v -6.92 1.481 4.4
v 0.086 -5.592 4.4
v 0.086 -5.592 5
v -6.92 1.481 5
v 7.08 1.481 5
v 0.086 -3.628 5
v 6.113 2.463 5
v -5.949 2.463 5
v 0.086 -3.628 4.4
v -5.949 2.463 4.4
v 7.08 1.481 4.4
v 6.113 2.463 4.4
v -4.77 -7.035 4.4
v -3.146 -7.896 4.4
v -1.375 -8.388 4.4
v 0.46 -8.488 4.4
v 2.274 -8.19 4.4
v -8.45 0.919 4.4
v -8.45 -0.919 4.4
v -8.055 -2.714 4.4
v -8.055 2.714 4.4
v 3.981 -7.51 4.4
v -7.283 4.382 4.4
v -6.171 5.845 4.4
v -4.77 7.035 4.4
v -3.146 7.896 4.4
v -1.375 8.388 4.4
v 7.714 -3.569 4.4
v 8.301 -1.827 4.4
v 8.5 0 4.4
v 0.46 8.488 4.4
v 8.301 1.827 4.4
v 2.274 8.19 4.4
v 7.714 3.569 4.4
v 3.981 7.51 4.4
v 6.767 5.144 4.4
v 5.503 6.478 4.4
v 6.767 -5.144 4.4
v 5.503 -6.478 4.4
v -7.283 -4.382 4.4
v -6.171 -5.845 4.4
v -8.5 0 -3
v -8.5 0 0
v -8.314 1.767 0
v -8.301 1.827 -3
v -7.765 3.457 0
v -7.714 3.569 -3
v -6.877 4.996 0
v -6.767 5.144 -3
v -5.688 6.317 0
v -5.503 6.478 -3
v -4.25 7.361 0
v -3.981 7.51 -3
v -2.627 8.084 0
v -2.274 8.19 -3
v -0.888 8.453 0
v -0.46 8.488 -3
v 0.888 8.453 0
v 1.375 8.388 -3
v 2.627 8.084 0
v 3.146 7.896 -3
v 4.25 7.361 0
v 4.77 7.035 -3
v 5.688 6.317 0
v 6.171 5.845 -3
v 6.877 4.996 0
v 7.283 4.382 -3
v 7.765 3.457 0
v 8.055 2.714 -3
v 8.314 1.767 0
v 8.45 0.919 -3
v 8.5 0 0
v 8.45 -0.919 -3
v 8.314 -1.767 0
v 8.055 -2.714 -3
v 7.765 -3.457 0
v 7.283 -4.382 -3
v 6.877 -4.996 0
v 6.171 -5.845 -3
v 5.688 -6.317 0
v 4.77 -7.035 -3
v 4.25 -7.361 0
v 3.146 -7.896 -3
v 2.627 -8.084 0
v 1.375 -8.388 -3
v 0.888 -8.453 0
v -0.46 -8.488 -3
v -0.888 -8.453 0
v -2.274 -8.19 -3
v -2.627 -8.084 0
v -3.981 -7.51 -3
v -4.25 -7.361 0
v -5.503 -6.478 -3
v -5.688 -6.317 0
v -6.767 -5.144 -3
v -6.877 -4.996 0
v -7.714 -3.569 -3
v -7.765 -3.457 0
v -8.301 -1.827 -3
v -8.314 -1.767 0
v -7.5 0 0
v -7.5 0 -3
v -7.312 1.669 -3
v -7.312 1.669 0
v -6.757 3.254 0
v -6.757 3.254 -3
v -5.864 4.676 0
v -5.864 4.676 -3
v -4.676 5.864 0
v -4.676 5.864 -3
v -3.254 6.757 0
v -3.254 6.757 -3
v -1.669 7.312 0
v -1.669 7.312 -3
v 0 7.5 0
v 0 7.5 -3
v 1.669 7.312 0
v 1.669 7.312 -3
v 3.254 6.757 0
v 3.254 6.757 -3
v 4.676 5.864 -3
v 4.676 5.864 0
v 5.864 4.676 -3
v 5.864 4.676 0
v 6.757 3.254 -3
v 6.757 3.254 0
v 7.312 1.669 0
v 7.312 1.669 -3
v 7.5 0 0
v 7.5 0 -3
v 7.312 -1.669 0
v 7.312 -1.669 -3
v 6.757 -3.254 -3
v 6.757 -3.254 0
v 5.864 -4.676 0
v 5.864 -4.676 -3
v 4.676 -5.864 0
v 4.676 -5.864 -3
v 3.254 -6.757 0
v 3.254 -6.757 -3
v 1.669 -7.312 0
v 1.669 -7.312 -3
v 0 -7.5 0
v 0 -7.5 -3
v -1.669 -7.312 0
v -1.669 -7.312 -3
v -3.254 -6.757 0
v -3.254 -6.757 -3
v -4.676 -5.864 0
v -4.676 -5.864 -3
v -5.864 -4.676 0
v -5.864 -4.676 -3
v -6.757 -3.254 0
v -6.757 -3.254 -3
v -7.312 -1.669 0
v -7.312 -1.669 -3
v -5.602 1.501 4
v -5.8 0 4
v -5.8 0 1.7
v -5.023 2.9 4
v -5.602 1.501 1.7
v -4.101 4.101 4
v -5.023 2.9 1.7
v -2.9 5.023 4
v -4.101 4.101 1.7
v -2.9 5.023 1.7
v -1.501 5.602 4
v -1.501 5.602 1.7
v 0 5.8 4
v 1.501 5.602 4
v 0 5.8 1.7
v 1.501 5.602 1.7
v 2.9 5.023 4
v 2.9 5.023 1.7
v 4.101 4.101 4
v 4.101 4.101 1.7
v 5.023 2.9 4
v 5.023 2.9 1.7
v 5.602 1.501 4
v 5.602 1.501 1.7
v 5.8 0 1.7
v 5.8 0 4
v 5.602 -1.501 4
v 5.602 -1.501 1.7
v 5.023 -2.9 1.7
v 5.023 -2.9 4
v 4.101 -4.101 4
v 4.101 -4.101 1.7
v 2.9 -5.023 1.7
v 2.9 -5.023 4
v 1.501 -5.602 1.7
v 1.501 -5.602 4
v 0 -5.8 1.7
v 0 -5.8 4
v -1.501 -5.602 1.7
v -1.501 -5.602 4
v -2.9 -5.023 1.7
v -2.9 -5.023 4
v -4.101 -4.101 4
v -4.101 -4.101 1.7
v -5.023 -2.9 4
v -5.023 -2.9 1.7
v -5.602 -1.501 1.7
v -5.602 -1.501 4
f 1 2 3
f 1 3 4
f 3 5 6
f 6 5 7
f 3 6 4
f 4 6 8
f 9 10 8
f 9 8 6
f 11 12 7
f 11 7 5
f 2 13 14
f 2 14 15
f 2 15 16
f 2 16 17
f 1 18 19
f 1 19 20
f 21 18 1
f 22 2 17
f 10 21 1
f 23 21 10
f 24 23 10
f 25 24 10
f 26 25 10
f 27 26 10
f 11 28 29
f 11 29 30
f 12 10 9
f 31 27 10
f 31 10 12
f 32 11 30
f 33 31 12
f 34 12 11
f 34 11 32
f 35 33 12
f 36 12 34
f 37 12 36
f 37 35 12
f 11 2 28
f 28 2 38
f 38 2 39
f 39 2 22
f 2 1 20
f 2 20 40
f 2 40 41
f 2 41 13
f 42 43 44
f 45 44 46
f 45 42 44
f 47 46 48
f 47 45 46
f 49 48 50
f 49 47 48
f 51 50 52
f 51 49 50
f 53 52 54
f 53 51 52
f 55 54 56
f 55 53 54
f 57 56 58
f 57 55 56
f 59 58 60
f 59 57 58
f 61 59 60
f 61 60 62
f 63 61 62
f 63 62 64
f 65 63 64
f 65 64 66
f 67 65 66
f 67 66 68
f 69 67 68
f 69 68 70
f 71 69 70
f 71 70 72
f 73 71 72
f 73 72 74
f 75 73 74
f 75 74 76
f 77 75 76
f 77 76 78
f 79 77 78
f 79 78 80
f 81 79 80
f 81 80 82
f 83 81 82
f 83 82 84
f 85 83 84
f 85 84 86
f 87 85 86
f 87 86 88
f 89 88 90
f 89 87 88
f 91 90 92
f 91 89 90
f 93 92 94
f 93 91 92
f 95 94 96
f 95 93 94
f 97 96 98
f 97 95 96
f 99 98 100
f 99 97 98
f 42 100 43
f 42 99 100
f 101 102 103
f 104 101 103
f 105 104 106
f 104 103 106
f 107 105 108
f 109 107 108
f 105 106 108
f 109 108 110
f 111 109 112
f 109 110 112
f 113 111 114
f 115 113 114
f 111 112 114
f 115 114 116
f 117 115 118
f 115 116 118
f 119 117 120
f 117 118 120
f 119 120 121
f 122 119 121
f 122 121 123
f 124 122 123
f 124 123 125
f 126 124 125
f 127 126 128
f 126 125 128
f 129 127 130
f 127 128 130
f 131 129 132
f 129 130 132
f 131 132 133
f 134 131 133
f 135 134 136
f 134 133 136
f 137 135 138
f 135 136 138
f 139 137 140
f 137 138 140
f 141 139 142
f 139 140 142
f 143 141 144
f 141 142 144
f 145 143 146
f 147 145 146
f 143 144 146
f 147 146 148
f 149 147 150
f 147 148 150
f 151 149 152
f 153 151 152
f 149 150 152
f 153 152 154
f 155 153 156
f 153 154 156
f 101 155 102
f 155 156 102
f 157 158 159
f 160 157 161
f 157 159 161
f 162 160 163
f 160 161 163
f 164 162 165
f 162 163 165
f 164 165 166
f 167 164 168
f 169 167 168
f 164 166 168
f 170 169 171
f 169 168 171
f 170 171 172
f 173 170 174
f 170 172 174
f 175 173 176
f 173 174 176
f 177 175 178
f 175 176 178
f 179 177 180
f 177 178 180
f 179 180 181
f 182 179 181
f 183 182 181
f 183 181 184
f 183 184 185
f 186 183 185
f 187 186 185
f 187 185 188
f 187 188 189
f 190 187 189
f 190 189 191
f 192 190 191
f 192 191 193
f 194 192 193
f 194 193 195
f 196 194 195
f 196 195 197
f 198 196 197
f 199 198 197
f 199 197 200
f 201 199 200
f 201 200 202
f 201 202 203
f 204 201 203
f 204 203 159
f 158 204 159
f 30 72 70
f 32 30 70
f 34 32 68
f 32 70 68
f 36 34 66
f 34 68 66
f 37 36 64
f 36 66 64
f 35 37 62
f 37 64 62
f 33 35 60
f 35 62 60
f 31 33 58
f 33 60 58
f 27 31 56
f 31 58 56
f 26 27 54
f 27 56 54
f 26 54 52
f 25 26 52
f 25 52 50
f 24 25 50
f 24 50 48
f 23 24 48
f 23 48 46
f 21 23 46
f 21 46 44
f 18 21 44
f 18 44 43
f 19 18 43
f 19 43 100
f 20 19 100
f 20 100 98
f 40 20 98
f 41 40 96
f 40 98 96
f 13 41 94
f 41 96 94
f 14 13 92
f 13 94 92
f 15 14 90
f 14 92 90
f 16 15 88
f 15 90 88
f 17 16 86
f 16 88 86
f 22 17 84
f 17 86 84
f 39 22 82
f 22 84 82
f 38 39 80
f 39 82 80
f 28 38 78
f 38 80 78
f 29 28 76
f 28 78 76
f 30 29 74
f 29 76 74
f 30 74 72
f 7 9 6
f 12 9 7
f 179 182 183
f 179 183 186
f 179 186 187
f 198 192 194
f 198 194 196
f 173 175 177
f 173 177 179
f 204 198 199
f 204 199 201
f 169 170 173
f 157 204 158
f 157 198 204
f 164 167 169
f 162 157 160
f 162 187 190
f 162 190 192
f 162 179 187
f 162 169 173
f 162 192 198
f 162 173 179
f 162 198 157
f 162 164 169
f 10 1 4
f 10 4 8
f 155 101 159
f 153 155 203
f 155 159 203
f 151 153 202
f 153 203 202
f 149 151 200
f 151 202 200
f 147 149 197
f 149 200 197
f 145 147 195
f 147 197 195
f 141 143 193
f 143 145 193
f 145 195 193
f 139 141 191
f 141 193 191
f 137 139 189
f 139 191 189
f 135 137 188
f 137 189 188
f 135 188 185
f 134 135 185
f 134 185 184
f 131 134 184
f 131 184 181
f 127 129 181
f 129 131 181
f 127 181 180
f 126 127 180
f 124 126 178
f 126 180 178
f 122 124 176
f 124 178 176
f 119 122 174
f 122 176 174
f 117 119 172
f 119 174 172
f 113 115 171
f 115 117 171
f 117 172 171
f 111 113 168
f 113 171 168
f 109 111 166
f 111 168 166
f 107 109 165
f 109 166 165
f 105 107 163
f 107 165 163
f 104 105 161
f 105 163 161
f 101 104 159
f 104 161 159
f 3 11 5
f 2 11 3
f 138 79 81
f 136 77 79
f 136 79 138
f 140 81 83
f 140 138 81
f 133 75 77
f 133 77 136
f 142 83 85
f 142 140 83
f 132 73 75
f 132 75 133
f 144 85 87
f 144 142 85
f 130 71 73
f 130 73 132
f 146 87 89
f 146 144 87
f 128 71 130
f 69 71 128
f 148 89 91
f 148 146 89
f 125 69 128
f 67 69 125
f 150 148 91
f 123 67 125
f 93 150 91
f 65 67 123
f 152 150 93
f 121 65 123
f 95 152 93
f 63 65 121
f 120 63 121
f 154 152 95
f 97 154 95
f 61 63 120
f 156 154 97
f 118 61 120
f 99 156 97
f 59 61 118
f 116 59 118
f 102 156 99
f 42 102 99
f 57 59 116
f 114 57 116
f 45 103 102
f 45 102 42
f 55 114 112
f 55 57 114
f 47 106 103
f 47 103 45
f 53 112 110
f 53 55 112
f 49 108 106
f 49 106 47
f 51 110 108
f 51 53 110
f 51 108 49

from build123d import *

# Parameters (mm, degrees)
SKETCH1_R           = 8.5
BOSS_EXTRUDE1_DEPTH = 4.4
SKETCH3_R           = 5.8
CUT_EXTRUDE1_DEPTH  = 4
BOSS_EXTRUDE3_START = 3
SKETCH4_R           = 8.5
SKETCH4_R_2         = 7.5
BOSS_EXTRUDE3_DEPTH = 3
BOSS_EXTRUDE4_DEPTH = 0.6


with BuildPart() as part:
    # Sketch1 → Boss-Extrude1 (new body)
    with BuildSketch(Plane.XY):
        Circle(SKETCH1_R)
    extrude(amount=BOSS_EXTRUDE1_DEPTH)

    # Sketch3 → Cut-Extrude1 (cut)
    with BuildSketch(Plane(origin=(0, 0, 0), x_dir=(-1, 0, 0), z_dir=(0, 0, -1))):
        Circle(SKETCH3_R)
    extrude(amount=-CUT_EXTRUDE1_DEPTH, mode=Mode.SUBTRACT)

    # Sketch4 → Boss-Extrude3 (add)
    with BuildSketch(Plane(origin=(0, 0, 0), x_dir=(-1, 0, 0), z_dir=(0, 0, -1)).offset(BOSS_EXTRUDE3_START)):
        Circle(SKETCH4_R)
        Circle(SKETCH4_R_2, mode=Mode.SUBTRACT)
    extrude(amount=-BOSS_EXTRUDE3_DEPTH)

    # Sketch6 → Cut-Revolve1 (revolve, cut)
    with BuildSketch(Plane(origin=(0, 0, 0), x_dir=(1, 0, 0), z_dir=(0, 1, 0)), mode=Mode.PRIVATE) as cut_revolve1_sk:
        Polygon((7.5, 0), (5.8, -1.7), (5.8, 0), align=None)
    revolve(cut_revolve1_sk.sketch.rotate(Axis((0, 0, -5.5), (0, 0, 1)), 180), axis=Axis((0, 0, -5.5), (0, 0, 1)), mode=Mode.SUBTRACT)

    # Sketch2 → Boss-Extrude4 (add)
    with BuildSketch(Plane.XY.offset(4.4)):
        Polygon((0.086062041, -5.591622222), (-6.919546933, 1.481294445), (-5.949194369, 2.462864958), (0.086062041, -3.628481196), (6.11290499, 2.462864958), (7.080453067, 1.481294445), align=None)
    extrude(amount=BOSS_EXTRUDE4_DEPTH)


solid = part.part
